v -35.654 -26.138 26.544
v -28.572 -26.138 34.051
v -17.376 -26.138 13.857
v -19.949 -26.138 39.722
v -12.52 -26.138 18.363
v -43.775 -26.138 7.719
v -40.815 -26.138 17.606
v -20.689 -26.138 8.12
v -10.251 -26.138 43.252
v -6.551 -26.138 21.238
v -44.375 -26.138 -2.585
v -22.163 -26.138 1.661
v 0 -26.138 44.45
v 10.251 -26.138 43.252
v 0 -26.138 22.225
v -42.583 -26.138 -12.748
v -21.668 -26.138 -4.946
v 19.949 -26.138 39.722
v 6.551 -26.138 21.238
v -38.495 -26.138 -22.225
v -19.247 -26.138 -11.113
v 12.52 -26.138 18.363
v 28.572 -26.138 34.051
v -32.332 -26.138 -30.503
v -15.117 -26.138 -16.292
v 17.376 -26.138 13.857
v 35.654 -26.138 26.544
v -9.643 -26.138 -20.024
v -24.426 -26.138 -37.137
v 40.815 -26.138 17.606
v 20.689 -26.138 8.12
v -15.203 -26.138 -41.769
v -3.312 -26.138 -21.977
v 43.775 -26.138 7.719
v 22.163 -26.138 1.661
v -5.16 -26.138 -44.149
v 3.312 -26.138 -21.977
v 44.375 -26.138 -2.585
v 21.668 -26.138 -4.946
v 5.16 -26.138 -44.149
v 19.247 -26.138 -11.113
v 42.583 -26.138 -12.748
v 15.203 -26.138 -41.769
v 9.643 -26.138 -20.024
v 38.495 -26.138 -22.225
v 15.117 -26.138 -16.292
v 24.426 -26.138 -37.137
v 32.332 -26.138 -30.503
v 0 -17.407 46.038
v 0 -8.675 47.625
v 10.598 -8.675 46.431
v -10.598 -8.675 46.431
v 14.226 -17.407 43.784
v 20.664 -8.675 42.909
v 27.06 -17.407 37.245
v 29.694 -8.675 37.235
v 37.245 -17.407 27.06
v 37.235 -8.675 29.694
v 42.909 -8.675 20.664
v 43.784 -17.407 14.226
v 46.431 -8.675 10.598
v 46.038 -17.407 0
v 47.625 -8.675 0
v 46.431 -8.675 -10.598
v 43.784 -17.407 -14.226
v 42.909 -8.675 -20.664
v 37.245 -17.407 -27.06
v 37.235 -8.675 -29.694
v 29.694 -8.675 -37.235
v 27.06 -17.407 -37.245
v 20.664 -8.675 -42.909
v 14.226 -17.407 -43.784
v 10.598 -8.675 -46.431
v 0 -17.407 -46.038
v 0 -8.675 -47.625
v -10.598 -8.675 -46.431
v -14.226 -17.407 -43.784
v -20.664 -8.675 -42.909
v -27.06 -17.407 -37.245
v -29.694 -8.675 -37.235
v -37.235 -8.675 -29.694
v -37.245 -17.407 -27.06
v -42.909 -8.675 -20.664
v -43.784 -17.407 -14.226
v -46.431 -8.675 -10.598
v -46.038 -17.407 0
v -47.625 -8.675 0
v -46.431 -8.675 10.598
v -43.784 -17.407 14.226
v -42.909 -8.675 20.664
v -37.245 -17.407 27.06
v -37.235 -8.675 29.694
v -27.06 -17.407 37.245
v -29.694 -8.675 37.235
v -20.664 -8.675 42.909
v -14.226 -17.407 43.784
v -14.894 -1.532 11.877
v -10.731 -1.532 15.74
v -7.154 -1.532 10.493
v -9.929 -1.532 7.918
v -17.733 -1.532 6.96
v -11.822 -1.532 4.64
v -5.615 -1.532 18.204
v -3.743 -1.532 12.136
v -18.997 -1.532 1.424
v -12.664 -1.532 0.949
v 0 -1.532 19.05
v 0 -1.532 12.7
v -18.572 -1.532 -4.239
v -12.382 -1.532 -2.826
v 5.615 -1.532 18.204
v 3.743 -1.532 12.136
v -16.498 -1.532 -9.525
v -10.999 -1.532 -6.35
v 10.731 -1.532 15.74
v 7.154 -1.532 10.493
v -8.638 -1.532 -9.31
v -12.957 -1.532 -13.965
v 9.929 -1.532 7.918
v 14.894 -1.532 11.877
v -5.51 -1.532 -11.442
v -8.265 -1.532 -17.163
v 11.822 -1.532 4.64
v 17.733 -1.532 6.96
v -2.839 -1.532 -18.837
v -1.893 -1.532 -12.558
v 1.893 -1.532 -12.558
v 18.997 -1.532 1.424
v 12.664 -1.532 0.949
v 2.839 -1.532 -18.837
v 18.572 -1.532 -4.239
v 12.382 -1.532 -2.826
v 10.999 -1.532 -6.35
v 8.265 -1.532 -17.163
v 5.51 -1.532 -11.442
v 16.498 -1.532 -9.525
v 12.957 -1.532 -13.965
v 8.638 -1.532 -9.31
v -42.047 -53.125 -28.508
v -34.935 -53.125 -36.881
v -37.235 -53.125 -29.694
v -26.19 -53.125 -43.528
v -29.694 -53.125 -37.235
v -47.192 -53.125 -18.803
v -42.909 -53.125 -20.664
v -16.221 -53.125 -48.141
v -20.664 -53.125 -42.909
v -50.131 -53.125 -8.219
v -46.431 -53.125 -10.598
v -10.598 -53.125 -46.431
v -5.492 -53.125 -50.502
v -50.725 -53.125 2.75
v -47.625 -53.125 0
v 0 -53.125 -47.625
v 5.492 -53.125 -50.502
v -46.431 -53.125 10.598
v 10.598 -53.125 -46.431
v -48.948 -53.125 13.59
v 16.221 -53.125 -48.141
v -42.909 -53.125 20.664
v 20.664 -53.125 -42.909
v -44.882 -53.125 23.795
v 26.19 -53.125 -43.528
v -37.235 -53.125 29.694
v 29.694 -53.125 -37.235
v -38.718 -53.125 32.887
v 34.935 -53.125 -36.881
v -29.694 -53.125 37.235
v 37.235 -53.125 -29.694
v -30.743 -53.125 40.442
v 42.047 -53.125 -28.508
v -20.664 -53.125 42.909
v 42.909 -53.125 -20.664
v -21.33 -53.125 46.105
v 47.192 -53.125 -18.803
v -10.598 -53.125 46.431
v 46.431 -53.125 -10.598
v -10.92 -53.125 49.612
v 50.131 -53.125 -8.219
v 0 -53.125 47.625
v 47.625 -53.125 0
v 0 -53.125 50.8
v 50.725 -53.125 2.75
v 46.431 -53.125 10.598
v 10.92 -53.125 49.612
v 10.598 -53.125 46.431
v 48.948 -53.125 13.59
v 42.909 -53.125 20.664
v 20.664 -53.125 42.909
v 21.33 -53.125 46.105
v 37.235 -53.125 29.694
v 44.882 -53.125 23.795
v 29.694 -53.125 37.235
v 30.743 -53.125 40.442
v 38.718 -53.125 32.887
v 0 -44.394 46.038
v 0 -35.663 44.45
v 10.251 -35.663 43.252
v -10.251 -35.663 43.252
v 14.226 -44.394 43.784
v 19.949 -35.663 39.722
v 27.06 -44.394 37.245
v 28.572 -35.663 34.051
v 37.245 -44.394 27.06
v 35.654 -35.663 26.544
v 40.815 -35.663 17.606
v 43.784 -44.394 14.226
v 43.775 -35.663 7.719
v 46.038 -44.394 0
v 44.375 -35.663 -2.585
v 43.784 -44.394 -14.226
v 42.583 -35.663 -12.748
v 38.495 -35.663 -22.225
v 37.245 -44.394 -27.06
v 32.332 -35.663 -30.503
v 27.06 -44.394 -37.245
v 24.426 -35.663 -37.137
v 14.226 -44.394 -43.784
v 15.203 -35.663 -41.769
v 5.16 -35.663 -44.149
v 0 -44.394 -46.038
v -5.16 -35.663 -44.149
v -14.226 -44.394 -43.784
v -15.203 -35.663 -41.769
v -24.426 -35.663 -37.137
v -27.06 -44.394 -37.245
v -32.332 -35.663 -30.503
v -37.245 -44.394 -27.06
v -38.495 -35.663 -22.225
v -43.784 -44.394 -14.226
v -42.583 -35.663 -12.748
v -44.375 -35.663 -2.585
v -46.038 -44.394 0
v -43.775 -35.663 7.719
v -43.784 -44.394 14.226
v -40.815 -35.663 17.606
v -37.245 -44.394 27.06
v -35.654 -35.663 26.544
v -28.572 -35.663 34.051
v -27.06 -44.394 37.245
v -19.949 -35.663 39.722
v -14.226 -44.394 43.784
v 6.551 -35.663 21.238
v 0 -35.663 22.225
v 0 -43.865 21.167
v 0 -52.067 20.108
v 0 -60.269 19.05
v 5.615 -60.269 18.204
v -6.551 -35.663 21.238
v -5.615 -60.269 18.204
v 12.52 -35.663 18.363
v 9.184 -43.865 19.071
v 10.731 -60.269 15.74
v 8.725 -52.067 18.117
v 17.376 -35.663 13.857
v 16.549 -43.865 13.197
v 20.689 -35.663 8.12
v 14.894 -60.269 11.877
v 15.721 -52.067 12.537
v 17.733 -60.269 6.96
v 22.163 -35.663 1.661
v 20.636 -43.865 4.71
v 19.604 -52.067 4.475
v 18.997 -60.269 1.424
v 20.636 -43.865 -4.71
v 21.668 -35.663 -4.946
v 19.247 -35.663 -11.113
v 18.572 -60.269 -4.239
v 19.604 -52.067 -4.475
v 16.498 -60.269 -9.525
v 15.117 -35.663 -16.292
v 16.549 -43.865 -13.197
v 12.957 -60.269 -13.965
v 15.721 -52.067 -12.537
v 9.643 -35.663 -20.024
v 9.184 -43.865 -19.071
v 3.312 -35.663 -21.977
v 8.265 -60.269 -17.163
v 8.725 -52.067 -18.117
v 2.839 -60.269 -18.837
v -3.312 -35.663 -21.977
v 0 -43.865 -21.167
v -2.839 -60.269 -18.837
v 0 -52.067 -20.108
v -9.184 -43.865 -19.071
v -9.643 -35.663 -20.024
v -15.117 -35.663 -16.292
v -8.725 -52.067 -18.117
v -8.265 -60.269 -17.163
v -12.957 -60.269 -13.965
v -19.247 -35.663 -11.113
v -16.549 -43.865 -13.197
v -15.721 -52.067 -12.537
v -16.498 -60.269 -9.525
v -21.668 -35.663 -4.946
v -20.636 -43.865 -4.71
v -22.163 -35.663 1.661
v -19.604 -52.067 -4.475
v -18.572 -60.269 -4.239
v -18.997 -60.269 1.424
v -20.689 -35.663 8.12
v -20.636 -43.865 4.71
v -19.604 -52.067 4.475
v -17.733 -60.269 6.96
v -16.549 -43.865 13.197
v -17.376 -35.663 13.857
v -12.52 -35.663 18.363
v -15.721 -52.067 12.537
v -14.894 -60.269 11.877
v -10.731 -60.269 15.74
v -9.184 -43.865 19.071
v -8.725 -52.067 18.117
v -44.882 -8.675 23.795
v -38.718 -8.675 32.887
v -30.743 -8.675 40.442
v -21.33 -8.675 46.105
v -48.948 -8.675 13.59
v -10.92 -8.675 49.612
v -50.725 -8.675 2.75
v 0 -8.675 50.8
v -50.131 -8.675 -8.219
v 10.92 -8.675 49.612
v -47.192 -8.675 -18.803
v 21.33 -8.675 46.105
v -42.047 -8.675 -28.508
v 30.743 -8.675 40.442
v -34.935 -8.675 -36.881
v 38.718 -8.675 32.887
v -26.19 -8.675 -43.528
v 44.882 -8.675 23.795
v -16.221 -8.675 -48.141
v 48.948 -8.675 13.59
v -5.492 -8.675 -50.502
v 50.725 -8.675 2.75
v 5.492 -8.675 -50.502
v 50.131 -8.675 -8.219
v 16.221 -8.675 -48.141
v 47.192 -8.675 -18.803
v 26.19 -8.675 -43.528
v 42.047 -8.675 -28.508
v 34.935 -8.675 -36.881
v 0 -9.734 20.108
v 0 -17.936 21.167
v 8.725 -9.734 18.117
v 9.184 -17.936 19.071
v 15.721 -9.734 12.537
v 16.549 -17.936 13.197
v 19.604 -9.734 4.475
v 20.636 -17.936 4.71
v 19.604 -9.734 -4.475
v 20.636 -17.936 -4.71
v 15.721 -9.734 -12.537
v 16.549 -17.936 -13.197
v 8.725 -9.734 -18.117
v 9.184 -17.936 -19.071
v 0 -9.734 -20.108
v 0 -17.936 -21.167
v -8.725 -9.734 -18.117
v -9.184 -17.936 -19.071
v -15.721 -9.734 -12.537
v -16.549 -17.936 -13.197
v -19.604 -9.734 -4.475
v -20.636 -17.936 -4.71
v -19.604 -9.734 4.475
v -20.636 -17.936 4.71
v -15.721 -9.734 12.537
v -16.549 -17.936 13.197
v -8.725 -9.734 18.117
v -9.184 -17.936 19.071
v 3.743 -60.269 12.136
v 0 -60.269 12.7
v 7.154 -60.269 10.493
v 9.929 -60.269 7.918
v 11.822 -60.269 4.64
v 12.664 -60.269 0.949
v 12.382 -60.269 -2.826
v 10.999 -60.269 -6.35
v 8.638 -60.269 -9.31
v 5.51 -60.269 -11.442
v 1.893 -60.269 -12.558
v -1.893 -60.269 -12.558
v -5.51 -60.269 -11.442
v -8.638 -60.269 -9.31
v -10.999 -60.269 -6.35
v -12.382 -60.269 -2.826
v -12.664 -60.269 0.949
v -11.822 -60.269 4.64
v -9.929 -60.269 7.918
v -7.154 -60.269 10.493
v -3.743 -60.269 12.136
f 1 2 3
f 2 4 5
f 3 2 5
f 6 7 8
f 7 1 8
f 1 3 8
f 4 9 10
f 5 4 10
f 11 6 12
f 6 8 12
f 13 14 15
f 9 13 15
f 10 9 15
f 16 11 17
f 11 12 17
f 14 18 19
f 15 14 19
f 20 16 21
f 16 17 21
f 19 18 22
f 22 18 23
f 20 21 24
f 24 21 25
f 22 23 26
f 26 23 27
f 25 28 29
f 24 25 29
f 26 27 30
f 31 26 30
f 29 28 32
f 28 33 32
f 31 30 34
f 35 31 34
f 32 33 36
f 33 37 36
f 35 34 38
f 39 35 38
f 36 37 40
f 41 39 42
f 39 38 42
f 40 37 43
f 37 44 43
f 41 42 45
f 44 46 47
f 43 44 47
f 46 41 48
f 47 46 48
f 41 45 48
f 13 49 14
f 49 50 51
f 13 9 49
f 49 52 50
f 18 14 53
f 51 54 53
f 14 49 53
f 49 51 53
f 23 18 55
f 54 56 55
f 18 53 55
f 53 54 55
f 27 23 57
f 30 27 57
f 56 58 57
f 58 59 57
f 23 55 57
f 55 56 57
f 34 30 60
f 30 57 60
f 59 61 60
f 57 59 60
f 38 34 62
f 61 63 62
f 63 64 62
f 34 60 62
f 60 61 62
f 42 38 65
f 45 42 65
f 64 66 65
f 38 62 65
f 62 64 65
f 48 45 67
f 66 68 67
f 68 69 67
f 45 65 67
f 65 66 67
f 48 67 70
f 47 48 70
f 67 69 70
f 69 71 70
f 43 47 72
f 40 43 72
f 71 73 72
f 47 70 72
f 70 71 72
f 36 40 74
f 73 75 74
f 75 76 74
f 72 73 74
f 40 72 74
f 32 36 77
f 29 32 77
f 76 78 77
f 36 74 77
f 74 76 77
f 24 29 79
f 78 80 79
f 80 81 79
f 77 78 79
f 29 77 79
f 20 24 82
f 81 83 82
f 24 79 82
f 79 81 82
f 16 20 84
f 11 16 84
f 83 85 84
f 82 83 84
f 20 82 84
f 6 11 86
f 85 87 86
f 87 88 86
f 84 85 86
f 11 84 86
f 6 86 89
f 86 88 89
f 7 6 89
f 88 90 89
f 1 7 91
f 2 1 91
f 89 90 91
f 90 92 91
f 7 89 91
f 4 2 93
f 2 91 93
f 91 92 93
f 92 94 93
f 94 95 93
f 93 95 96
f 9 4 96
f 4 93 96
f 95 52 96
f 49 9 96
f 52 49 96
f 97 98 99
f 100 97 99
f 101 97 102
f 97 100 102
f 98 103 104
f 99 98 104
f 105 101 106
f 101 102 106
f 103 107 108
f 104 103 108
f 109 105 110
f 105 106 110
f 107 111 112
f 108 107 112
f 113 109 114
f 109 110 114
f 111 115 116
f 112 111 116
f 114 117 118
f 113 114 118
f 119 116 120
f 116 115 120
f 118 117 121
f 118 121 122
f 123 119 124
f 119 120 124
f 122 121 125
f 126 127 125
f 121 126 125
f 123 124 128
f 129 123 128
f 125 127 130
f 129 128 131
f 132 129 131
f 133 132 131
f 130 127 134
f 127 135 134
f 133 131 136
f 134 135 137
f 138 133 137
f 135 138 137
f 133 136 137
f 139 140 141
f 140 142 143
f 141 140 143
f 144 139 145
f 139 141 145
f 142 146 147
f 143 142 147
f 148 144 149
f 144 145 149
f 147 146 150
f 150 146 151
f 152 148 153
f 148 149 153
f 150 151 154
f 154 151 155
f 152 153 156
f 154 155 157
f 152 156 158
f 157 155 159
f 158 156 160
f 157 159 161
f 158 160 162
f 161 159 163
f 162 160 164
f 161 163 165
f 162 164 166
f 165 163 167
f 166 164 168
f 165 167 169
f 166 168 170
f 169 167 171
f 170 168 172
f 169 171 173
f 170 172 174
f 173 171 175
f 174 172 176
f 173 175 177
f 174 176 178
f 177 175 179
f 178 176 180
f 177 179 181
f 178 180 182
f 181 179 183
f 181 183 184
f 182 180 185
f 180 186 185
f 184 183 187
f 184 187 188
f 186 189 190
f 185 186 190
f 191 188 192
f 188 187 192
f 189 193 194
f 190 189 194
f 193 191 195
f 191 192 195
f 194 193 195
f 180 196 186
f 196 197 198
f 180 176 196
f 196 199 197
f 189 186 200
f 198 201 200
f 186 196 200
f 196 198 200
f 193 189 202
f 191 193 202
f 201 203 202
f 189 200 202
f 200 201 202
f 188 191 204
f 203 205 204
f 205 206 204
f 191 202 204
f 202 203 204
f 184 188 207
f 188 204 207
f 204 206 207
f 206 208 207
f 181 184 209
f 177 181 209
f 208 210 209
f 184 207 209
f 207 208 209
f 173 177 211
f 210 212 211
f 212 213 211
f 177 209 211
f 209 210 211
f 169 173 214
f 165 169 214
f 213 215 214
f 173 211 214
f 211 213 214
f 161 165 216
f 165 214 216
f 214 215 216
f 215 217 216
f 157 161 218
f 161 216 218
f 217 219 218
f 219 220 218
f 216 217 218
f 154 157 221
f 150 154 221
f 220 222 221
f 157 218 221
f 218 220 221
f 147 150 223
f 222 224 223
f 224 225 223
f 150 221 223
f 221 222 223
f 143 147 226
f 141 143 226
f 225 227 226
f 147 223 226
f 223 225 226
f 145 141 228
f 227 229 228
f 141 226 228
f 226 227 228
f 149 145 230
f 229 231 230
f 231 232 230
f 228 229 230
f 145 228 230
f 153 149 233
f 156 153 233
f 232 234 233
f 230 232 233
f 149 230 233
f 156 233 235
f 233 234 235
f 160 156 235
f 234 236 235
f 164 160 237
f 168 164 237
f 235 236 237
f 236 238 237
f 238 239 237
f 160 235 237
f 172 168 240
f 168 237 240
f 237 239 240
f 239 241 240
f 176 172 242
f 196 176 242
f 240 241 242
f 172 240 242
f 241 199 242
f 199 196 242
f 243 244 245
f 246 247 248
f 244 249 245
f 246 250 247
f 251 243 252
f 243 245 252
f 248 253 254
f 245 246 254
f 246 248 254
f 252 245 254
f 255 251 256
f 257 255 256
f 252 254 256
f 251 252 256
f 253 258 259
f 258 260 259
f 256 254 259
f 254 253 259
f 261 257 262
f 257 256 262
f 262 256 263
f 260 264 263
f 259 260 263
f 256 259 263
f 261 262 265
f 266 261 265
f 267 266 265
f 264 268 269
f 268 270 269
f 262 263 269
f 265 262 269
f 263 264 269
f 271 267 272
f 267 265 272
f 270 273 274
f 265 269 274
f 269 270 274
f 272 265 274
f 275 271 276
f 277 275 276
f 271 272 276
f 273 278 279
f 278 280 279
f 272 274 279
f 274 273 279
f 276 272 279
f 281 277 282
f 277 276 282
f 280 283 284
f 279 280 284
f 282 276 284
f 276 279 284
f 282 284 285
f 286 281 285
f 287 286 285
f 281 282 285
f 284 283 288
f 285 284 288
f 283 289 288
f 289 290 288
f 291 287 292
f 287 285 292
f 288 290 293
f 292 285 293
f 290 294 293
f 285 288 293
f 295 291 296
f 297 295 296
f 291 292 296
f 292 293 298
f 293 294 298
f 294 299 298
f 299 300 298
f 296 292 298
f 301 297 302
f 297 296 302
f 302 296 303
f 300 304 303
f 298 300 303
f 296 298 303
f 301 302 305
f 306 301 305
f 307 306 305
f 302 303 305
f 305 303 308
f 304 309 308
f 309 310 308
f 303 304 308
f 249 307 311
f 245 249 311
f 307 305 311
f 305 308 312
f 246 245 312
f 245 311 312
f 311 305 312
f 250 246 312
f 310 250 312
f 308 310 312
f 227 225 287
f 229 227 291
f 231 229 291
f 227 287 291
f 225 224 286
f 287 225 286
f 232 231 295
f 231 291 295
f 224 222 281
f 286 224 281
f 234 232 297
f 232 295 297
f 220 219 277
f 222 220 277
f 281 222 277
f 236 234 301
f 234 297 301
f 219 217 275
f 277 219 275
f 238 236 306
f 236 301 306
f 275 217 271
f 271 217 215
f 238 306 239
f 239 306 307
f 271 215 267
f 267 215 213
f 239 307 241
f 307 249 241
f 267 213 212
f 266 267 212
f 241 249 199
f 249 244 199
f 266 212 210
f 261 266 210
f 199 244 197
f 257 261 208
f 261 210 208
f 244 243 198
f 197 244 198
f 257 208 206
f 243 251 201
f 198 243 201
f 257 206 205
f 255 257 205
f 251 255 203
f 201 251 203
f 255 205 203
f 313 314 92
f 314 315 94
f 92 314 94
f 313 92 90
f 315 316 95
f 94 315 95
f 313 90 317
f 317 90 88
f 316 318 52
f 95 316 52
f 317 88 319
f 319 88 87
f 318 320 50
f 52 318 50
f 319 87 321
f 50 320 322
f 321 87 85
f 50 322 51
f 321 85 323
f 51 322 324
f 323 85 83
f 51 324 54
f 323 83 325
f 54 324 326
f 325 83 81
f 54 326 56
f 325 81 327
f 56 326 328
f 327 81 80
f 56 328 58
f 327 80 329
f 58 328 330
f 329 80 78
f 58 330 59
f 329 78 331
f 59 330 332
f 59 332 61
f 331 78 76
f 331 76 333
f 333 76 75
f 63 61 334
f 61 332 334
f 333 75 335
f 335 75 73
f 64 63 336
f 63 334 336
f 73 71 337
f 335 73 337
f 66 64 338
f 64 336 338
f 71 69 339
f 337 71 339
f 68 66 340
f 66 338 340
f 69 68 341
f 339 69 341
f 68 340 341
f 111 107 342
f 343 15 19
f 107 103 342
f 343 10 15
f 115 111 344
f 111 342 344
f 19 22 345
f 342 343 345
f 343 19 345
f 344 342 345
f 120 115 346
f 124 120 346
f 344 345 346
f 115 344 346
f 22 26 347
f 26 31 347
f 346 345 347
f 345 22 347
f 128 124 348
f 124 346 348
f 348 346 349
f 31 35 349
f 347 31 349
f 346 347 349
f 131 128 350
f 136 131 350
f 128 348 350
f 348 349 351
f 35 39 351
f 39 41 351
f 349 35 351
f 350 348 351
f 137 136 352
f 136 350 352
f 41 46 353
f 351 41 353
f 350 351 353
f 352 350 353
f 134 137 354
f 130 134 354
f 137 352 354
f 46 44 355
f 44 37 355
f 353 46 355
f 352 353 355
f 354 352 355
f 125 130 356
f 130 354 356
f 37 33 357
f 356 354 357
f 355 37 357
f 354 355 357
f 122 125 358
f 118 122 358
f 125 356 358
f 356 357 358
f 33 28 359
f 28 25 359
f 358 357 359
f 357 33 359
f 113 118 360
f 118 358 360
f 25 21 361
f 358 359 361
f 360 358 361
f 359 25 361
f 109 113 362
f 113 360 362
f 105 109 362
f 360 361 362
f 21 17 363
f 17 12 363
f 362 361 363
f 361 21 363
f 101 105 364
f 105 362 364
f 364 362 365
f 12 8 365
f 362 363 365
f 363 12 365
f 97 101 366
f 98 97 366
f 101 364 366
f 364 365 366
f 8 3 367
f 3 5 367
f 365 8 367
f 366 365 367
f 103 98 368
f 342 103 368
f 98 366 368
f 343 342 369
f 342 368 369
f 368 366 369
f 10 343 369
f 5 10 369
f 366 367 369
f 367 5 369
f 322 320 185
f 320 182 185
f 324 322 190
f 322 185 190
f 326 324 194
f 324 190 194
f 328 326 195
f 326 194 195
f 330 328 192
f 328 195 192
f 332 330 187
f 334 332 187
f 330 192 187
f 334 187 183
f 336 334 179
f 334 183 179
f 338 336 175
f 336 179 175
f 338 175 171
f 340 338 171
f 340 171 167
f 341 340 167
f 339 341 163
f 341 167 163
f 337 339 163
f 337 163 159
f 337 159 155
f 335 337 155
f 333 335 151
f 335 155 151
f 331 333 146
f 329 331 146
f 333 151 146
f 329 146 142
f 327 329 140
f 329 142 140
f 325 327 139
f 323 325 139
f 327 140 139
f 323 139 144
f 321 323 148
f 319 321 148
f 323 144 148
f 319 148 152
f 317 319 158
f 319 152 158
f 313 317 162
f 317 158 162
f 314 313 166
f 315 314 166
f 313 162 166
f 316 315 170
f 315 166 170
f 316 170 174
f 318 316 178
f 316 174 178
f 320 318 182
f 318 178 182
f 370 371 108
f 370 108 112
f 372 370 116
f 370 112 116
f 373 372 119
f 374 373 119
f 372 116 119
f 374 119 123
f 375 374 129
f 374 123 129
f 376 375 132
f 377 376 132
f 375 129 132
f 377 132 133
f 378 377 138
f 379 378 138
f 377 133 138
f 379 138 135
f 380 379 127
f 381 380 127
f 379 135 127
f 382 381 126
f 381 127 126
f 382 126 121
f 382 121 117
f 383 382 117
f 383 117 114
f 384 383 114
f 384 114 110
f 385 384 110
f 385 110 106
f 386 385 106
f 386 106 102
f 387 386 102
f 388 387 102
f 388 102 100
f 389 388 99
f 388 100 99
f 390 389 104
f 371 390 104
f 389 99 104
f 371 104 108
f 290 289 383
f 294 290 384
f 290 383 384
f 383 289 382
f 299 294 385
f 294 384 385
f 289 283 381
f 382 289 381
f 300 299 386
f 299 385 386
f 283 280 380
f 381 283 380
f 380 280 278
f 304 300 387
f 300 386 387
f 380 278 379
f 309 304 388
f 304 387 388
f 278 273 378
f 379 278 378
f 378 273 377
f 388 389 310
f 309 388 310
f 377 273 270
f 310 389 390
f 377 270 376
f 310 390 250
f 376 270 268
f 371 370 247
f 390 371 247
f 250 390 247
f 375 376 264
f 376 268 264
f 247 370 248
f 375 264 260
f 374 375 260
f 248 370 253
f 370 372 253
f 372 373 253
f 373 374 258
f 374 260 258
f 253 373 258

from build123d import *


with BuildPart() as f1:
    # F0 (on Right) → F1 (revolve)
    with BuildSketch(Plane.YZ):
        Polygon((-60.269166, 19.05), (-60.269166, 12.7), (-30.900416, 12.7), (-30.900416, 50.8), (-53.125416, 50.8), (-53.125416, 47.625), (-35.662916, 44.45), (-35.662916, 22.225), align=None)
        Polygon((-30.900416, 50.8), (-30.900416, 12.7), (-1.531666, 12.7), (-1.531666, 19.05), (-26.137916, 22.225), (-26.137916, 44.45), (-8.675416, 47.625), (-8.675416, 50.8), align=None)
    revolve(axis=Axis((0, 4.061773, 0), (0, 1, 0)))


solid = f1.part
